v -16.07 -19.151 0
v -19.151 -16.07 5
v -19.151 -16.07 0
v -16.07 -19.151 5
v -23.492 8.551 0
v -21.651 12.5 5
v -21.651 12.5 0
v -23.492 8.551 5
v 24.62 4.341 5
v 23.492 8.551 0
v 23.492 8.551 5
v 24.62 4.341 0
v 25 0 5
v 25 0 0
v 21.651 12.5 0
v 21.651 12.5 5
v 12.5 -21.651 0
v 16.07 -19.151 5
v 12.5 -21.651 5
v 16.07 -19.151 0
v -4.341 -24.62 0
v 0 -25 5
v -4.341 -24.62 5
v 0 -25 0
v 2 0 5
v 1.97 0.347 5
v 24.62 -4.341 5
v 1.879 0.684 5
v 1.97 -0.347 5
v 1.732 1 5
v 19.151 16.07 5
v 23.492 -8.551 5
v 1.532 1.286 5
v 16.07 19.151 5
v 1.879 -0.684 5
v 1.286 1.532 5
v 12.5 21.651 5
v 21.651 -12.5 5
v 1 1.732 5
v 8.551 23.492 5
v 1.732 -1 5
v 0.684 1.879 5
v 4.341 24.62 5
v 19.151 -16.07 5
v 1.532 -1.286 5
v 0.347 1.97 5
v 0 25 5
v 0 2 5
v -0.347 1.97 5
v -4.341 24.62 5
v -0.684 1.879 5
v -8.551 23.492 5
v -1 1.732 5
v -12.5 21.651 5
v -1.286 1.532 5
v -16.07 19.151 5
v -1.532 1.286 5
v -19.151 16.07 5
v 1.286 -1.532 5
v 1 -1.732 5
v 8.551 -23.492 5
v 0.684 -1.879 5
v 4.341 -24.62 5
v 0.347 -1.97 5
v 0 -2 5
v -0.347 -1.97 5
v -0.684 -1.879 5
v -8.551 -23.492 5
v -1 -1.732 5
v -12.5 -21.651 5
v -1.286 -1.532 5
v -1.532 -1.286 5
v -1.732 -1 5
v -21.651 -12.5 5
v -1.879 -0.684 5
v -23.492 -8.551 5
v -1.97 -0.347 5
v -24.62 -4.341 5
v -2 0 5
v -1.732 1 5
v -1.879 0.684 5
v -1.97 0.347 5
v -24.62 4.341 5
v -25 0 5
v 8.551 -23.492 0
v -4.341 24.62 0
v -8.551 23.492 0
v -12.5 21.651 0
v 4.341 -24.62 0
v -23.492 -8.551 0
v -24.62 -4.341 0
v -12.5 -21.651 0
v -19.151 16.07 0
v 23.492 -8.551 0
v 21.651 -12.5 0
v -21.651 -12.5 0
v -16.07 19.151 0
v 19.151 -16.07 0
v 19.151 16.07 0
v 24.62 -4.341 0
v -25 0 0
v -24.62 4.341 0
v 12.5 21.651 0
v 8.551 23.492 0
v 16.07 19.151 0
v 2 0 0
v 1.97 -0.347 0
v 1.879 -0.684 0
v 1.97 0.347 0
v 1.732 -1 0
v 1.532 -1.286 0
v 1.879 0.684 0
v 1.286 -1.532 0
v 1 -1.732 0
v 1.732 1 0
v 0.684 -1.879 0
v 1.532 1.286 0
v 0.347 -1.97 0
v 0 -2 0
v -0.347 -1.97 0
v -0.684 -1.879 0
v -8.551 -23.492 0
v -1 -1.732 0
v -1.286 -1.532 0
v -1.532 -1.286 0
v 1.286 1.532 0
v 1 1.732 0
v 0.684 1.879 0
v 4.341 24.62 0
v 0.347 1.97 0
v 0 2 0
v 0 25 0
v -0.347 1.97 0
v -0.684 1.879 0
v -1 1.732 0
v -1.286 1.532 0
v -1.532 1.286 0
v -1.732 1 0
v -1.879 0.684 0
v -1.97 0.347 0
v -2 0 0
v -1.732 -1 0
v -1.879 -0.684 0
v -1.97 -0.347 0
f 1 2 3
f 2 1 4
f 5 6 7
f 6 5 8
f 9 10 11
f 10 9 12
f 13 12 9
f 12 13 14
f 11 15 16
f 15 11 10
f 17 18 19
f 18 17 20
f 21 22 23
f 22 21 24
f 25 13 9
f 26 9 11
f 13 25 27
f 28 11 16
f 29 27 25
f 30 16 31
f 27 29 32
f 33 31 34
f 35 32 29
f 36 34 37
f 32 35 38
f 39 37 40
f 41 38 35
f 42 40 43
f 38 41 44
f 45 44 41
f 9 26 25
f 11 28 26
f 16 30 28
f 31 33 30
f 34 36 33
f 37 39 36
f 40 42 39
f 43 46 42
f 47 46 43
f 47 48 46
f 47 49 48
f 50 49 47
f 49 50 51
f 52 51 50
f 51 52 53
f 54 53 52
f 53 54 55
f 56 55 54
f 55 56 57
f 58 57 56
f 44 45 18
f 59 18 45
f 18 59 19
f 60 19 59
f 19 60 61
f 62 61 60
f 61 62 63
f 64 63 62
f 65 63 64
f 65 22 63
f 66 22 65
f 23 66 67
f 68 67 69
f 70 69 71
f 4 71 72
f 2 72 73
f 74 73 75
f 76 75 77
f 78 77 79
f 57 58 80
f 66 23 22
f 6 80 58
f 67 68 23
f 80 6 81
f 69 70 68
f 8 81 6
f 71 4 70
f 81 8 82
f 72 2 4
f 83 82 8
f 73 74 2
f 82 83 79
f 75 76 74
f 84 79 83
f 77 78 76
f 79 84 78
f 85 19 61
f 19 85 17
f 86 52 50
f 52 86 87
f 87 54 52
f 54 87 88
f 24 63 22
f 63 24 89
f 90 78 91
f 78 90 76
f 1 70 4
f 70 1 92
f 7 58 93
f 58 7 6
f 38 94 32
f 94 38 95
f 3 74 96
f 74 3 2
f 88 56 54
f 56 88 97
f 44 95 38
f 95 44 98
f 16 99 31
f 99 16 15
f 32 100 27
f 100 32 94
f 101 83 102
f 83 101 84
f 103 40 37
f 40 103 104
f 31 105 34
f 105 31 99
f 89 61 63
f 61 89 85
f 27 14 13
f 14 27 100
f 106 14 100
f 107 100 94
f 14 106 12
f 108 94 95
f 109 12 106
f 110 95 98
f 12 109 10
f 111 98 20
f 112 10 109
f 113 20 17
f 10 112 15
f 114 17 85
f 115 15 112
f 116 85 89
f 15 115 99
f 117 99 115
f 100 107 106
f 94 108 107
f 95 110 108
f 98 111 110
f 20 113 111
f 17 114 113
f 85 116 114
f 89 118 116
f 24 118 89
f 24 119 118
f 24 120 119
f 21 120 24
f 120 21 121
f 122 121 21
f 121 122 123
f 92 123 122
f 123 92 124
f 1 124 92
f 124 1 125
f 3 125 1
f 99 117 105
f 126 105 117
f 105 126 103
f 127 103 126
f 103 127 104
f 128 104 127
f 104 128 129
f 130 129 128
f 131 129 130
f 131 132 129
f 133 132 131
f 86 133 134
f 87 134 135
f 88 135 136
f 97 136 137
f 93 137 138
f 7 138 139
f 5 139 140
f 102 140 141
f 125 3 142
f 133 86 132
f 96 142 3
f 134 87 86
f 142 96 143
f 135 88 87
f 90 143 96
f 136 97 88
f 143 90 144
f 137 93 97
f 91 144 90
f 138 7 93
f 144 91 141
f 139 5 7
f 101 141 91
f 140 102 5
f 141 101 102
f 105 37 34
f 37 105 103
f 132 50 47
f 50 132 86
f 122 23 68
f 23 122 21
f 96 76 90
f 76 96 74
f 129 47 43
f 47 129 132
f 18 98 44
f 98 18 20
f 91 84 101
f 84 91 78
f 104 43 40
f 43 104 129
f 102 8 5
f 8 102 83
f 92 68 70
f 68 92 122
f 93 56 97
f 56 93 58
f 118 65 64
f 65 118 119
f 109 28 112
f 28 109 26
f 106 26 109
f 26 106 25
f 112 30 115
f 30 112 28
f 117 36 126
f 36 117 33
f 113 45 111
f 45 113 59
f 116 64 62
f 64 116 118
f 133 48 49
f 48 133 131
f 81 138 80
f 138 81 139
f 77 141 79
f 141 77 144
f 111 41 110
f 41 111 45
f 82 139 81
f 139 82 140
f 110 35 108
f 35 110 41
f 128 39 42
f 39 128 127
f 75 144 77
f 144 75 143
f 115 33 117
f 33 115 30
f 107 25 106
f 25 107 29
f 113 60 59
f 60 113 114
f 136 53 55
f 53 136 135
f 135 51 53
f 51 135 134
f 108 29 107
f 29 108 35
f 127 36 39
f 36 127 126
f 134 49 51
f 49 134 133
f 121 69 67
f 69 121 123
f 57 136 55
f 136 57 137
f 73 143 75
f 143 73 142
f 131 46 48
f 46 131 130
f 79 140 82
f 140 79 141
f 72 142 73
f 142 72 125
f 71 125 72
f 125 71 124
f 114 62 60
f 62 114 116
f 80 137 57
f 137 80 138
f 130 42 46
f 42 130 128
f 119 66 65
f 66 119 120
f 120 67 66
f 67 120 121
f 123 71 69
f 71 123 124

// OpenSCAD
axle_ground = 120;
roller_or = 25;

hub_or = axle_ground - roller_or;

num_rollers = 12;
$fn = num_rollers*3;

hub_h = 10;
hub_ir = 2;

bearing_h = hub_h*2;
bearing_ir = 6/2;
bearing_or = 14/2;



roller_h = 5;

roller_axle_or = 2;
roller_axle_l = 2;
roller_axle_head_or = 2 * roller_axle_or;
roller_axle_head_h = 2 * roller_axle_or;
roller_clearance = 12;
slot_clearance = 2;

arm_r = 35;
arm_hole_ir = 3;


roller_angle = 360 / num_rollers;
slot_offset = hub_or - roller_or - roller_clearance;
slot_width = roller_h + slot_clearance;

module slot() {
    translate([slot_offset, -slot_width/2, 0]) 
        cube([roller_or + roller_clearance, 
              slot_width,
              hub_h]);
    translate([hub_or - roller_axle_or / 2 - roller_clearance / 2,
               roller_axle_l + slot_width / 2,
               hub_h / 2])
        rotate([90, 0, 0]) {
            cylinder(h=slot_width + 2 * roller_axle_l, r=roller_axle_or);
            translate([0, 0, -roller_axle_l - roller_axle_head_h + slot_clearance/2])
                cylinder(h=roller_axle_head_h + slot_clearance/2, r=roller_axle_head_or);
            translate([0, 0, 2 * roller_axle_l + slot_width])
                cylinder(h=roller_axle_head_h + slot_clearance/2, r=roller_axle_head_or);
        }
    % translate([hub_or - roller_axle_or / 2 - roller_clearance / 2,
               roller_h / 2,
               hub_h / 2])
               roller();
    
}

module roller_disc() {
    difference() {
        cylinder(h=roller_h, r=roller_or);
        cylinder(h=roller_h, r=roller_axle_or);
    }
}

module roller() {
    rotate([90, 0, 0])
    roller_disc();
}

module hub() {
    difference() {
        cylinder(h=hub_h/2, r=hub_or);
        for(j=[1:num_rollers])  {
            rotate([0,0,j*roller_angle]) {
                slot();
                if (j % 2 == 0)
                    translate([arm_r, 0, 0])
                        cylinder(h=hub_h*2, r=arm_hole_ir, center=true);
            }
            rotate([0,0,(j + 0.5)*roller_angle])
                translate([4 * hub_or / 5, 0, 0])
                        cylinder(h=hub_h * 2, r=hub_ir, center=true);
                
        }
        translate([0, 0, (hub_h - bearing_h)/2])
            cylinder(h=hub_h*2+1, r=bearing_or, $fn=60, center=true);
        cylinder(h=hub_h*2, r=bearing_ir, center=true);
         
    }
}

module plate() {
    hub();
    * translate([2 * hub_or + roller_clearance, 0, 0])
        hub();
    * for(i=[0:4]) {
        for (j=[0:1]) {
            translate([-hub_or + roller_or + i * (2 * roller_or + roller_clearance/2), 
                    hub_or + roller_or + roller_clearance/2 + j * (2 * roller_or + roller_clearance / 2), 0])
                roller_disc();
        }   
        }
}
//plate();
//!slot();
roller_disc();
